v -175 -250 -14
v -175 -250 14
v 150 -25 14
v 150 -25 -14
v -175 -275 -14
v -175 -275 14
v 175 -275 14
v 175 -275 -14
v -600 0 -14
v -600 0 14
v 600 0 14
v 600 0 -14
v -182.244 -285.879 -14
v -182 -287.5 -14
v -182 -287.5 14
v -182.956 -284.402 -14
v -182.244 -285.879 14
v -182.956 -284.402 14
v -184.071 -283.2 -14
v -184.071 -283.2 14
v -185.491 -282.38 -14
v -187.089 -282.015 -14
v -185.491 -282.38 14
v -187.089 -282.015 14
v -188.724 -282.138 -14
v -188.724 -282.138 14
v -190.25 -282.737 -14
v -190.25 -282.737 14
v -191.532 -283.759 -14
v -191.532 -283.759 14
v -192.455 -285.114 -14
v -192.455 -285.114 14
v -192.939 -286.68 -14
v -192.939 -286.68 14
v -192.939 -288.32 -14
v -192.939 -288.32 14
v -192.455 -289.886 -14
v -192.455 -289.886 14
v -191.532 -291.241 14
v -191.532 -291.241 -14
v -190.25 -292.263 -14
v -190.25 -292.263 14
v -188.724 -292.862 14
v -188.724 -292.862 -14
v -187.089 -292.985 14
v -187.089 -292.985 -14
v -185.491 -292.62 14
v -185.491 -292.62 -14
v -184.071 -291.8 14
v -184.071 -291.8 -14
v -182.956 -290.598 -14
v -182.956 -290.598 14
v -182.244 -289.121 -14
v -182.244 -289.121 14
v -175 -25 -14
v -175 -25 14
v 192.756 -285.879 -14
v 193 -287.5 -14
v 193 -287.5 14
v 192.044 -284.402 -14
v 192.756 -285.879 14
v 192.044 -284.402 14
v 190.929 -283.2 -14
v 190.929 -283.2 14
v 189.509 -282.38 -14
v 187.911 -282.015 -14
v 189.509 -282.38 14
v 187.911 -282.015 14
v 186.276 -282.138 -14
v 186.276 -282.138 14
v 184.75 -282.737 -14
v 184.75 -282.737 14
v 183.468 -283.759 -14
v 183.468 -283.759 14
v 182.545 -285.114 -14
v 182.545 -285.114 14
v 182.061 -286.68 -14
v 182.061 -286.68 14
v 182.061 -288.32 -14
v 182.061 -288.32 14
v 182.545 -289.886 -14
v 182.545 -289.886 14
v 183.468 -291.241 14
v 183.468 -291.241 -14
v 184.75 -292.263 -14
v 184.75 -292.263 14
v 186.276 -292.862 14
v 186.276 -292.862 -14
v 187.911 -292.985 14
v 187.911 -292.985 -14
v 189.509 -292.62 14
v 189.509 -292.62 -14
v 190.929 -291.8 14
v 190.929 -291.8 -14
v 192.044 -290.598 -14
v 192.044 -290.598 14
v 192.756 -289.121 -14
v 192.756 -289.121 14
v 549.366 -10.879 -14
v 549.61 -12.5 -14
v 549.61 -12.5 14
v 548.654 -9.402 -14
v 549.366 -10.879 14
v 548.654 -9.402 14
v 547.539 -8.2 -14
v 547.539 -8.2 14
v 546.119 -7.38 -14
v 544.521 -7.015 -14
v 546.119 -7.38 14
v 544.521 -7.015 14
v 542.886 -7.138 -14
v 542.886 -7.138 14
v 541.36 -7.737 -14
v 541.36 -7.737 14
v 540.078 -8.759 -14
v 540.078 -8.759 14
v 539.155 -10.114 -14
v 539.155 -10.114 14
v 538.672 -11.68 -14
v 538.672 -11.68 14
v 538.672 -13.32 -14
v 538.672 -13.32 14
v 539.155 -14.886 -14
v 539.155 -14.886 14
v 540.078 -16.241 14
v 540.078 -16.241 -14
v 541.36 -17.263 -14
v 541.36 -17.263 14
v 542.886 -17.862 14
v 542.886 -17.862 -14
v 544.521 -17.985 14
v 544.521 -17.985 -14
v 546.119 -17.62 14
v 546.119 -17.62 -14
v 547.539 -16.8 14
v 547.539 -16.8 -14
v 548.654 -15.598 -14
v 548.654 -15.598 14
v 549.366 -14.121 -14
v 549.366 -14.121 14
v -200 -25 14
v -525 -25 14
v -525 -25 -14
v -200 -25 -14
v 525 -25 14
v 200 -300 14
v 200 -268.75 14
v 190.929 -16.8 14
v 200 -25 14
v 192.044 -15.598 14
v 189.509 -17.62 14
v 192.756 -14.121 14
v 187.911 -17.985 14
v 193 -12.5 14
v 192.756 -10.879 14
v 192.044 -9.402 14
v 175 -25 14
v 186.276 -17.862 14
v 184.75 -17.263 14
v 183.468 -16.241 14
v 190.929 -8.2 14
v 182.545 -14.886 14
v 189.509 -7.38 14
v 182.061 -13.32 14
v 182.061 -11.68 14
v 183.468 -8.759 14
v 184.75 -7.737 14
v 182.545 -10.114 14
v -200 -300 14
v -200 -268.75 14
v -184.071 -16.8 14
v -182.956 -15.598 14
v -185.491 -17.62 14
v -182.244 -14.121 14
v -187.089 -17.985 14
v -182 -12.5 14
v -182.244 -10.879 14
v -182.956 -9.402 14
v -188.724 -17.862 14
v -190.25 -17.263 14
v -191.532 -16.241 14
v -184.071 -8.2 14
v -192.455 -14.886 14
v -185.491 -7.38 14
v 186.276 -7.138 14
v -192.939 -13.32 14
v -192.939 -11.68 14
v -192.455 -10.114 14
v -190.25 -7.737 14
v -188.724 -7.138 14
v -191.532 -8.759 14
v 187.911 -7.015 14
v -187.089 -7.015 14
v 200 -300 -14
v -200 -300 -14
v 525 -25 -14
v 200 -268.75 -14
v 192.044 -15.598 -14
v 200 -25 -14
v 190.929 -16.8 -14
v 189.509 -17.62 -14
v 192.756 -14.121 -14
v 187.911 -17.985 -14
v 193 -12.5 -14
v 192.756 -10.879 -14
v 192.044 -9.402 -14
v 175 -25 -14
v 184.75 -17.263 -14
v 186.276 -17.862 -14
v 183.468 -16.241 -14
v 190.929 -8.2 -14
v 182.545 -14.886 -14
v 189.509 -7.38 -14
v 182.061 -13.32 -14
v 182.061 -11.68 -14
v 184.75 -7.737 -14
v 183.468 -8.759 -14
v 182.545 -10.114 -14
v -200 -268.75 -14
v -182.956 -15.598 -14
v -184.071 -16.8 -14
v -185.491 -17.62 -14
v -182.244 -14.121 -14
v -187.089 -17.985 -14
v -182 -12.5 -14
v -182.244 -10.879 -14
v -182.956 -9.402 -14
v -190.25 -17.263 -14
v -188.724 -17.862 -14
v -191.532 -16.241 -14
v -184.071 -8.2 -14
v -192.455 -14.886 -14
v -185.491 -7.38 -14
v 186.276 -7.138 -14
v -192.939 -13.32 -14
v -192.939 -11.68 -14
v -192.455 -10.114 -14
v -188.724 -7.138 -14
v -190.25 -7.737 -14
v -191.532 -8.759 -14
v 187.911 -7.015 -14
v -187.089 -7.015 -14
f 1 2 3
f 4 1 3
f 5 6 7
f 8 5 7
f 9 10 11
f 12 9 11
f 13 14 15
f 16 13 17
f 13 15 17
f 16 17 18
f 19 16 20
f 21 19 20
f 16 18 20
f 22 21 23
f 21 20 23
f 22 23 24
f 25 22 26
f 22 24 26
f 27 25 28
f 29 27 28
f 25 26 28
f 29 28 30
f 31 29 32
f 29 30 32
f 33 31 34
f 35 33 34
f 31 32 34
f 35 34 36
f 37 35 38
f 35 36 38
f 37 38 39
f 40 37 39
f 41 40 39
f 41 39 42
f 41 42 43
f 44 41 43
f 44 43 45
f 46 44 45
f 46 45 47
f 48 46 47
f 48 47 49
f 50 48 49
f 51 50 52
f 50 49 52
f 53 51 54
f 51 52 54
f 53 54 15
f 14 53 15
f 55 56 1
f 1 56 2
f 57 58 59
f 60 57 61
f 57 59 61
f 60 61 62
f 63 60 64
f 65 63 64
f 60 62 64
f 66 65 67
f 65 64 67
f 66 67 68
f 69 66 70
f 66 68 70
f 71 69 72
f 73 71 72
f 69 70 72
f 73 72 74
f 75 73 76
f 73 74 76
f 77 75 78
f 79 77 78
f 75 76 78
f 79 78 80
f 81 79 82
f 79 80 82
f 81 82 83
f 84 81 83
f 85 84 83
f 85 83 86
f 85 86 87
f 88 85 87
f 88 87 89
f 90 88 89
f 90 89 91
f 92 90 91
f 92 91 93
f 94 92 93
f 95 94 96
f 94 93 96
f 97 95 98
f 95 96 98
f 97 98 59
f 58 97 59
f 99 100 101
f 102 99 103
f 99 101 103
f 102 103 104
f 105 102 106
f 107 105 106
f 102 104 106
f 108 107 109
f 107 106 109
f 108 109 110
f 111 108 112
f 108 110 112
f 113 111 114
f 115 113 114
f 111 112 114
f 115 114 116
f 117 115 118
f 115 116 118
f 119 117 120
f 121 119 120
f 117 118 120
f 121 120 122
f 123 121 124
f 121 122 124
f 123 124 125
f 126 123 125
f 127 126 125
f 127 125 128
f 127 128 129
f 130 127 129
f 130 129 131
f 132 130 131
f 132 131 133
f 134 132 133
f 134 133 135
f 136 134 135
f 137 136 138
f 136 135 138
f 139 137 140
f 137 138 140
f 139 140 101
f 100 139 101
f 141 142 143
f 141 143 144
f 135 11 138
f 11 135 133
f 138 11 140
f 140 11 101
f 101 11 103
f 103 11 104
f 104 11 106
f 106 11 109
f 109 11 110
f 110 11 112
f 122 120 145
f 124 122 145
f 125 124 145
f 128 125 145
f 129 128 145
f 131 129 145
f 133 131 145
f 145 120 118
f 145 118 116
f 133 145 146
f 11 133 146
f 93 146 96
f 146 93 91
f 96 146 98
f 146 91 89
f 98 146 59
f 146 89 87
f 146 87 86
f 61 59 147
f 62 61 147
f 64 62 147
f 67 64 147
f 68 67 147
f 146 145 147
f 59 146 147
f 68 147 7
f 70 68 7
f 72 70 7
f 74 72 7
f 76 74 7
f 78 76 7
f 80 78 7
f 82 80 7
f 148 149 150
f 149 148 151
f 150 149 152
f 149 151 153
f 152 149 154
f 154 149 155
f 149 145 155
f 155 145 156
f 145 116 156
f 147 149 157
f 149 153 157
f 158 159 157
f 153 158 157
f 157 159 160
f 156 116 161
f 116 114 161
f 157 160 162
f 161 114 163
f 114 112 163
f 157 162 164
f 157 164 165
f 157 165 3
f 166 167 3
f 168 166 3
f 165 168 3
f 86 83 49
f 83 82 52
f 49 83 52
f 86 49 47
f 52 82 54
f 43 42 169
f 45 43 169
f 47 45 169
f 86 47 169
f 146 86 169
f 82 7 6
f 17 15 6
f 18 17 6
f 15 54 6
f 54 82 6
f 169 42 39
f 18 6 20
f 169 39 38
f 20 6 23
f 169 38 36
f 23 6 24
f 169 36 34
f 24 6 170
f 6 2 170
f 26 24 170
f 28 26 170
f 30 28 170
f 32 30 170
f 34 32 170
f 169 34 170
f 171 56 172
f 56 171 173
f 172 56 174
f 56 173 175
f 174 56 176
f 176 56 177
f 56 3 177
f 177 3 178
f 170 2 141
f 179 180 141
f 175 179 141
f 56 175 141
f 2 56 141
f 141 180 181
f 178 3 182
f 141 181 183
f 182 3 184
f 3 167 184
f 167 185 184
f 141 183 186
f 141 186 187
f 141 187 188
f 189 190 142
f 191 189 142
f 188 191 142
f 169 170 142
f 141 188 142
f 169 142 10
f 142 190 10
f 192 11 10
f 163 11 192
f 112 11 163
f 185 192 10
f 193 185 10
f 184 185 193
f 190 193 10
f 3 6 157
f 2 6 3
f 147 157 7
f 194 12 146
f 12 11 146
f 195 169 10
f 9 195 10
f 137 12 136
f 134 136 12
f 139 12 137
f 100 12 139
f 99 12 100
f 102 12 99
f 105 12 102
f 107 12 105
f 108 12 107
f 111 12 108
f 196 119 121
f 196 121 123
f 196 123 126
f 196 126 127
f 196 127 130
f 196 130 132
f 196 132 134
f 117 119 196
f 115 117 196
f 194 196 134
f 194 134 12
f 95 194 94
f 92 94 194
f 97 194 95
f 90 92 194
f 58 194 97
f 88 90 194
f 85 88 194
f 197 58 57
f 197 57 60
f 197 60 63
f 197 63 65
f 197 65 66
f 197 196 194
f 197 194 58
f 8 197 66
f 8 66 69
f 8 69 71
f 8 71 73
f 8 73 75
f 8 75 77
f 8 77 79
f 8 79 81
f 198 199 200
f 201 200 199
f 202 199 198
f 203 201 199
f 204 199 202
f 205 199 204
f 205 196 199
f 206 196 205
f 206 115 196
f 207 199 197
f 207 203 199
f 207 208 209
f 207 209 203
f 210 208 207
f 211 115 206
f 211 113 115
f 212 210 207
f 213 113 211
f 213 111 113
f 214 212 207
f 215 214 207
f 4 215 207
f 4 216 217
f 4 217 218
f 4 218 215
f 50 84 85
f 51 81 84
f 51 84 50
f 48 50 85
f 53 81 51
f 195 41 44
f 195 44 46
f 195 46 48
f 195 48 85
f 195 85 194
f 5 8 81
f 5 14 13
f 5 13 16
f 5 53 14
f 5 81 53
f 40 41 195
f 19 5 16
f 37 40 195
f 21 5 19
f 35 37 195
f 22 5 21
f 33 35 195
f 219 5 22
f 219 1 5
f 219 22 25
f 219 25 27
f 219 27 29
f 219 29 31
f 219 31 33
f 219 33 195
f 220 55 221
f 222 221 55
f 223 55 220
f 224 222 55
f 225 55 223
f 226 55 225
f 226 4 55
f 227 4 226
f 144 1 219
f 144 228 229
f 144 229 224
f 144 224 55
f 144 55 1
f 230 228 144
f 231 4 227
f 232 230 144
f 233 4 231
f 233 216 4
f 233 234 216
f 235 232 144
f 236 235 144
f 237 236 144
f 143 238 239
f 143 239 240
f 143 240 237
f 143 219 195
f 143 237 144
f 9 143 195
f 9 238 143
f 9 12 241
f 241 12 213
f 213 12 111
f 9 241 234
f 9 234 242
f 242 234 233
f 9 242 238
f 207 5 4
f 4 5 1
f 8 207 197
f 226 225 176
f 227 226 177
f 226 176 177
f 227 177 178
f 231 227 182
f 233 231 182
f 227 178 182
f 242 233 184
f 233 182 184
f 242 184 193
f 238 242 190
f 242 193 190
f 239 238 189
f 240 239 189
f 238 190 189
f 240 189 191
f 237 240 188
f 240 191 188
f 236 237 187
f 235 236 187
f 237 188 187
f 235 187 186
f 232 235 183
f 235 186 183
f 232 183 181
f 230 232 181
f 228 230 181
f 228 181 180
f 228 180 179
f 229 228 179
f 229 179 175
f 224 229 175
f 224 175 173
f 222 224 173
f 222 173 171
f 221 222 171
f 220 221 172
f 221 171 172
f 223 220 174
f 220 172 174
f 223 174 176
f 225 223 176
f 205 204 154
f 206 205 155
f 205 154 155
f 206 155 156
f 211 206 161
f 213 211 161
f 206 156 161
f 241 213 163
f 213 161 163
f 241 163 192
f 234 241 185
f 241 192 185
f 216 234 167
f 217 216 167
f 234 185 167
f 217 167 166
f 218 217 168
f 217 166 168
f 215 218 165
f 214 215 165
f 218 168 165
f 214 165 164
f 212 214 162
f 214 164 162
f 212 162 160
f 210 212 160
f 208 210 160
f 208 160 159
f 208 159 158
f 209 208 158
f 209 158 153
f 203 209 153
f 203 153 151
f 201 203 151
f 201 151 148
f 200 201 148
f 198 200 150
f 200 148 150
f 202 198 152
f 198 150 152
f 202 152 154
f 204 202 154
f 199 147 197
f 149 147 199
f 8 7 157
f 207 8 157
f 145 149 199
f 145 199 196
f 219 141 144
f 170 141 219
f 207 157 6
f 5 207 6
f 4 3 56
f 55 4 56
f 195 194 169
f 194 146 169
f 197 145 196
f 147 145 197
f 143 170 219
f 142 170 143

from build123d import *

# Parameters (mm, degrees)
BOSS_EXTRUDE1_DEPTH = 14
CUT_EXTRUDE1_DEPTH  = 28
CUT_EXTRUDE2_DEPTH  = 28
CUT_EXTRUDE3_DEPTH  = 28
SKETCH5_R           = 5.5
CUT_EXTRUDE4_DEPTH  = 28


with BuildPart() as part:
    # Sketch1 → Boss-Extrude1 (new, symmetric)
    with BuildSketch(Plane.XY):
        Polygon((-600, 0), (600, 0), (200, -300), (-200, -300), align=None)
    extrude(amount=BOSS_EXTRUDE1_DEPTH, both=True)

    # Sketch2 → Cut-Extrude1 (cut)
    with BuildSketch(Plane.XY.offset(14)):
        Polygon((-175, -275), (175, -275), (175, -25), align=None)
        Polygon((-175, -25), (-175, -250), (150, -25), align=None)
    extrude(amount=-CUT_EXTRUDE1_DEPTH, mode=Mode.SUBTRACT)

    # Sketch3 → Cut-Extrude2 (cut)
    with BuildSketch(Plane.XY.offset(14)):
        Polygon((-525, -25), (-200, -25), (-200, -268.75), align=None)
    extrude(amount=-CUT_EXTRUDE2_DEPTH, mode=Mode.SUBTRACT)

    # Sketch4 → Cut-Extrude3 (cut)
    with BuildSketch(Plane.XY.offset(14)):
        Polygon((200, -25), (525, -25), (200, -268.75), align=None)
    extrude(amount=-CUT_EXTRUDE3_DEPTH, mode=Mode.SUBTRACT)

    # Sketch5 → Cut-Extrude4 (cut)
    with BuildSketch(Plane.XY.offset(14)):
        with Locations((-187.5, -12.5)):
            Circle(SKETCH5_R)
        with Locations((-187.5, -287.5)):
            Circle(SKETCH5_R)
        with Locations((187.5, -287.5)):
            Circle(SKETCH5_R)
        with Locations((187.5, -12.5)):
            Circle(SKETCH5_R)
        with Locations((544.11011126, -12.5)):
            Circle(SKETCH5_R)
    extrude(amount=-CUT_EXTRUDE4_DEPTH, mode=Mode.SUBTRACT)


solid = part.part
